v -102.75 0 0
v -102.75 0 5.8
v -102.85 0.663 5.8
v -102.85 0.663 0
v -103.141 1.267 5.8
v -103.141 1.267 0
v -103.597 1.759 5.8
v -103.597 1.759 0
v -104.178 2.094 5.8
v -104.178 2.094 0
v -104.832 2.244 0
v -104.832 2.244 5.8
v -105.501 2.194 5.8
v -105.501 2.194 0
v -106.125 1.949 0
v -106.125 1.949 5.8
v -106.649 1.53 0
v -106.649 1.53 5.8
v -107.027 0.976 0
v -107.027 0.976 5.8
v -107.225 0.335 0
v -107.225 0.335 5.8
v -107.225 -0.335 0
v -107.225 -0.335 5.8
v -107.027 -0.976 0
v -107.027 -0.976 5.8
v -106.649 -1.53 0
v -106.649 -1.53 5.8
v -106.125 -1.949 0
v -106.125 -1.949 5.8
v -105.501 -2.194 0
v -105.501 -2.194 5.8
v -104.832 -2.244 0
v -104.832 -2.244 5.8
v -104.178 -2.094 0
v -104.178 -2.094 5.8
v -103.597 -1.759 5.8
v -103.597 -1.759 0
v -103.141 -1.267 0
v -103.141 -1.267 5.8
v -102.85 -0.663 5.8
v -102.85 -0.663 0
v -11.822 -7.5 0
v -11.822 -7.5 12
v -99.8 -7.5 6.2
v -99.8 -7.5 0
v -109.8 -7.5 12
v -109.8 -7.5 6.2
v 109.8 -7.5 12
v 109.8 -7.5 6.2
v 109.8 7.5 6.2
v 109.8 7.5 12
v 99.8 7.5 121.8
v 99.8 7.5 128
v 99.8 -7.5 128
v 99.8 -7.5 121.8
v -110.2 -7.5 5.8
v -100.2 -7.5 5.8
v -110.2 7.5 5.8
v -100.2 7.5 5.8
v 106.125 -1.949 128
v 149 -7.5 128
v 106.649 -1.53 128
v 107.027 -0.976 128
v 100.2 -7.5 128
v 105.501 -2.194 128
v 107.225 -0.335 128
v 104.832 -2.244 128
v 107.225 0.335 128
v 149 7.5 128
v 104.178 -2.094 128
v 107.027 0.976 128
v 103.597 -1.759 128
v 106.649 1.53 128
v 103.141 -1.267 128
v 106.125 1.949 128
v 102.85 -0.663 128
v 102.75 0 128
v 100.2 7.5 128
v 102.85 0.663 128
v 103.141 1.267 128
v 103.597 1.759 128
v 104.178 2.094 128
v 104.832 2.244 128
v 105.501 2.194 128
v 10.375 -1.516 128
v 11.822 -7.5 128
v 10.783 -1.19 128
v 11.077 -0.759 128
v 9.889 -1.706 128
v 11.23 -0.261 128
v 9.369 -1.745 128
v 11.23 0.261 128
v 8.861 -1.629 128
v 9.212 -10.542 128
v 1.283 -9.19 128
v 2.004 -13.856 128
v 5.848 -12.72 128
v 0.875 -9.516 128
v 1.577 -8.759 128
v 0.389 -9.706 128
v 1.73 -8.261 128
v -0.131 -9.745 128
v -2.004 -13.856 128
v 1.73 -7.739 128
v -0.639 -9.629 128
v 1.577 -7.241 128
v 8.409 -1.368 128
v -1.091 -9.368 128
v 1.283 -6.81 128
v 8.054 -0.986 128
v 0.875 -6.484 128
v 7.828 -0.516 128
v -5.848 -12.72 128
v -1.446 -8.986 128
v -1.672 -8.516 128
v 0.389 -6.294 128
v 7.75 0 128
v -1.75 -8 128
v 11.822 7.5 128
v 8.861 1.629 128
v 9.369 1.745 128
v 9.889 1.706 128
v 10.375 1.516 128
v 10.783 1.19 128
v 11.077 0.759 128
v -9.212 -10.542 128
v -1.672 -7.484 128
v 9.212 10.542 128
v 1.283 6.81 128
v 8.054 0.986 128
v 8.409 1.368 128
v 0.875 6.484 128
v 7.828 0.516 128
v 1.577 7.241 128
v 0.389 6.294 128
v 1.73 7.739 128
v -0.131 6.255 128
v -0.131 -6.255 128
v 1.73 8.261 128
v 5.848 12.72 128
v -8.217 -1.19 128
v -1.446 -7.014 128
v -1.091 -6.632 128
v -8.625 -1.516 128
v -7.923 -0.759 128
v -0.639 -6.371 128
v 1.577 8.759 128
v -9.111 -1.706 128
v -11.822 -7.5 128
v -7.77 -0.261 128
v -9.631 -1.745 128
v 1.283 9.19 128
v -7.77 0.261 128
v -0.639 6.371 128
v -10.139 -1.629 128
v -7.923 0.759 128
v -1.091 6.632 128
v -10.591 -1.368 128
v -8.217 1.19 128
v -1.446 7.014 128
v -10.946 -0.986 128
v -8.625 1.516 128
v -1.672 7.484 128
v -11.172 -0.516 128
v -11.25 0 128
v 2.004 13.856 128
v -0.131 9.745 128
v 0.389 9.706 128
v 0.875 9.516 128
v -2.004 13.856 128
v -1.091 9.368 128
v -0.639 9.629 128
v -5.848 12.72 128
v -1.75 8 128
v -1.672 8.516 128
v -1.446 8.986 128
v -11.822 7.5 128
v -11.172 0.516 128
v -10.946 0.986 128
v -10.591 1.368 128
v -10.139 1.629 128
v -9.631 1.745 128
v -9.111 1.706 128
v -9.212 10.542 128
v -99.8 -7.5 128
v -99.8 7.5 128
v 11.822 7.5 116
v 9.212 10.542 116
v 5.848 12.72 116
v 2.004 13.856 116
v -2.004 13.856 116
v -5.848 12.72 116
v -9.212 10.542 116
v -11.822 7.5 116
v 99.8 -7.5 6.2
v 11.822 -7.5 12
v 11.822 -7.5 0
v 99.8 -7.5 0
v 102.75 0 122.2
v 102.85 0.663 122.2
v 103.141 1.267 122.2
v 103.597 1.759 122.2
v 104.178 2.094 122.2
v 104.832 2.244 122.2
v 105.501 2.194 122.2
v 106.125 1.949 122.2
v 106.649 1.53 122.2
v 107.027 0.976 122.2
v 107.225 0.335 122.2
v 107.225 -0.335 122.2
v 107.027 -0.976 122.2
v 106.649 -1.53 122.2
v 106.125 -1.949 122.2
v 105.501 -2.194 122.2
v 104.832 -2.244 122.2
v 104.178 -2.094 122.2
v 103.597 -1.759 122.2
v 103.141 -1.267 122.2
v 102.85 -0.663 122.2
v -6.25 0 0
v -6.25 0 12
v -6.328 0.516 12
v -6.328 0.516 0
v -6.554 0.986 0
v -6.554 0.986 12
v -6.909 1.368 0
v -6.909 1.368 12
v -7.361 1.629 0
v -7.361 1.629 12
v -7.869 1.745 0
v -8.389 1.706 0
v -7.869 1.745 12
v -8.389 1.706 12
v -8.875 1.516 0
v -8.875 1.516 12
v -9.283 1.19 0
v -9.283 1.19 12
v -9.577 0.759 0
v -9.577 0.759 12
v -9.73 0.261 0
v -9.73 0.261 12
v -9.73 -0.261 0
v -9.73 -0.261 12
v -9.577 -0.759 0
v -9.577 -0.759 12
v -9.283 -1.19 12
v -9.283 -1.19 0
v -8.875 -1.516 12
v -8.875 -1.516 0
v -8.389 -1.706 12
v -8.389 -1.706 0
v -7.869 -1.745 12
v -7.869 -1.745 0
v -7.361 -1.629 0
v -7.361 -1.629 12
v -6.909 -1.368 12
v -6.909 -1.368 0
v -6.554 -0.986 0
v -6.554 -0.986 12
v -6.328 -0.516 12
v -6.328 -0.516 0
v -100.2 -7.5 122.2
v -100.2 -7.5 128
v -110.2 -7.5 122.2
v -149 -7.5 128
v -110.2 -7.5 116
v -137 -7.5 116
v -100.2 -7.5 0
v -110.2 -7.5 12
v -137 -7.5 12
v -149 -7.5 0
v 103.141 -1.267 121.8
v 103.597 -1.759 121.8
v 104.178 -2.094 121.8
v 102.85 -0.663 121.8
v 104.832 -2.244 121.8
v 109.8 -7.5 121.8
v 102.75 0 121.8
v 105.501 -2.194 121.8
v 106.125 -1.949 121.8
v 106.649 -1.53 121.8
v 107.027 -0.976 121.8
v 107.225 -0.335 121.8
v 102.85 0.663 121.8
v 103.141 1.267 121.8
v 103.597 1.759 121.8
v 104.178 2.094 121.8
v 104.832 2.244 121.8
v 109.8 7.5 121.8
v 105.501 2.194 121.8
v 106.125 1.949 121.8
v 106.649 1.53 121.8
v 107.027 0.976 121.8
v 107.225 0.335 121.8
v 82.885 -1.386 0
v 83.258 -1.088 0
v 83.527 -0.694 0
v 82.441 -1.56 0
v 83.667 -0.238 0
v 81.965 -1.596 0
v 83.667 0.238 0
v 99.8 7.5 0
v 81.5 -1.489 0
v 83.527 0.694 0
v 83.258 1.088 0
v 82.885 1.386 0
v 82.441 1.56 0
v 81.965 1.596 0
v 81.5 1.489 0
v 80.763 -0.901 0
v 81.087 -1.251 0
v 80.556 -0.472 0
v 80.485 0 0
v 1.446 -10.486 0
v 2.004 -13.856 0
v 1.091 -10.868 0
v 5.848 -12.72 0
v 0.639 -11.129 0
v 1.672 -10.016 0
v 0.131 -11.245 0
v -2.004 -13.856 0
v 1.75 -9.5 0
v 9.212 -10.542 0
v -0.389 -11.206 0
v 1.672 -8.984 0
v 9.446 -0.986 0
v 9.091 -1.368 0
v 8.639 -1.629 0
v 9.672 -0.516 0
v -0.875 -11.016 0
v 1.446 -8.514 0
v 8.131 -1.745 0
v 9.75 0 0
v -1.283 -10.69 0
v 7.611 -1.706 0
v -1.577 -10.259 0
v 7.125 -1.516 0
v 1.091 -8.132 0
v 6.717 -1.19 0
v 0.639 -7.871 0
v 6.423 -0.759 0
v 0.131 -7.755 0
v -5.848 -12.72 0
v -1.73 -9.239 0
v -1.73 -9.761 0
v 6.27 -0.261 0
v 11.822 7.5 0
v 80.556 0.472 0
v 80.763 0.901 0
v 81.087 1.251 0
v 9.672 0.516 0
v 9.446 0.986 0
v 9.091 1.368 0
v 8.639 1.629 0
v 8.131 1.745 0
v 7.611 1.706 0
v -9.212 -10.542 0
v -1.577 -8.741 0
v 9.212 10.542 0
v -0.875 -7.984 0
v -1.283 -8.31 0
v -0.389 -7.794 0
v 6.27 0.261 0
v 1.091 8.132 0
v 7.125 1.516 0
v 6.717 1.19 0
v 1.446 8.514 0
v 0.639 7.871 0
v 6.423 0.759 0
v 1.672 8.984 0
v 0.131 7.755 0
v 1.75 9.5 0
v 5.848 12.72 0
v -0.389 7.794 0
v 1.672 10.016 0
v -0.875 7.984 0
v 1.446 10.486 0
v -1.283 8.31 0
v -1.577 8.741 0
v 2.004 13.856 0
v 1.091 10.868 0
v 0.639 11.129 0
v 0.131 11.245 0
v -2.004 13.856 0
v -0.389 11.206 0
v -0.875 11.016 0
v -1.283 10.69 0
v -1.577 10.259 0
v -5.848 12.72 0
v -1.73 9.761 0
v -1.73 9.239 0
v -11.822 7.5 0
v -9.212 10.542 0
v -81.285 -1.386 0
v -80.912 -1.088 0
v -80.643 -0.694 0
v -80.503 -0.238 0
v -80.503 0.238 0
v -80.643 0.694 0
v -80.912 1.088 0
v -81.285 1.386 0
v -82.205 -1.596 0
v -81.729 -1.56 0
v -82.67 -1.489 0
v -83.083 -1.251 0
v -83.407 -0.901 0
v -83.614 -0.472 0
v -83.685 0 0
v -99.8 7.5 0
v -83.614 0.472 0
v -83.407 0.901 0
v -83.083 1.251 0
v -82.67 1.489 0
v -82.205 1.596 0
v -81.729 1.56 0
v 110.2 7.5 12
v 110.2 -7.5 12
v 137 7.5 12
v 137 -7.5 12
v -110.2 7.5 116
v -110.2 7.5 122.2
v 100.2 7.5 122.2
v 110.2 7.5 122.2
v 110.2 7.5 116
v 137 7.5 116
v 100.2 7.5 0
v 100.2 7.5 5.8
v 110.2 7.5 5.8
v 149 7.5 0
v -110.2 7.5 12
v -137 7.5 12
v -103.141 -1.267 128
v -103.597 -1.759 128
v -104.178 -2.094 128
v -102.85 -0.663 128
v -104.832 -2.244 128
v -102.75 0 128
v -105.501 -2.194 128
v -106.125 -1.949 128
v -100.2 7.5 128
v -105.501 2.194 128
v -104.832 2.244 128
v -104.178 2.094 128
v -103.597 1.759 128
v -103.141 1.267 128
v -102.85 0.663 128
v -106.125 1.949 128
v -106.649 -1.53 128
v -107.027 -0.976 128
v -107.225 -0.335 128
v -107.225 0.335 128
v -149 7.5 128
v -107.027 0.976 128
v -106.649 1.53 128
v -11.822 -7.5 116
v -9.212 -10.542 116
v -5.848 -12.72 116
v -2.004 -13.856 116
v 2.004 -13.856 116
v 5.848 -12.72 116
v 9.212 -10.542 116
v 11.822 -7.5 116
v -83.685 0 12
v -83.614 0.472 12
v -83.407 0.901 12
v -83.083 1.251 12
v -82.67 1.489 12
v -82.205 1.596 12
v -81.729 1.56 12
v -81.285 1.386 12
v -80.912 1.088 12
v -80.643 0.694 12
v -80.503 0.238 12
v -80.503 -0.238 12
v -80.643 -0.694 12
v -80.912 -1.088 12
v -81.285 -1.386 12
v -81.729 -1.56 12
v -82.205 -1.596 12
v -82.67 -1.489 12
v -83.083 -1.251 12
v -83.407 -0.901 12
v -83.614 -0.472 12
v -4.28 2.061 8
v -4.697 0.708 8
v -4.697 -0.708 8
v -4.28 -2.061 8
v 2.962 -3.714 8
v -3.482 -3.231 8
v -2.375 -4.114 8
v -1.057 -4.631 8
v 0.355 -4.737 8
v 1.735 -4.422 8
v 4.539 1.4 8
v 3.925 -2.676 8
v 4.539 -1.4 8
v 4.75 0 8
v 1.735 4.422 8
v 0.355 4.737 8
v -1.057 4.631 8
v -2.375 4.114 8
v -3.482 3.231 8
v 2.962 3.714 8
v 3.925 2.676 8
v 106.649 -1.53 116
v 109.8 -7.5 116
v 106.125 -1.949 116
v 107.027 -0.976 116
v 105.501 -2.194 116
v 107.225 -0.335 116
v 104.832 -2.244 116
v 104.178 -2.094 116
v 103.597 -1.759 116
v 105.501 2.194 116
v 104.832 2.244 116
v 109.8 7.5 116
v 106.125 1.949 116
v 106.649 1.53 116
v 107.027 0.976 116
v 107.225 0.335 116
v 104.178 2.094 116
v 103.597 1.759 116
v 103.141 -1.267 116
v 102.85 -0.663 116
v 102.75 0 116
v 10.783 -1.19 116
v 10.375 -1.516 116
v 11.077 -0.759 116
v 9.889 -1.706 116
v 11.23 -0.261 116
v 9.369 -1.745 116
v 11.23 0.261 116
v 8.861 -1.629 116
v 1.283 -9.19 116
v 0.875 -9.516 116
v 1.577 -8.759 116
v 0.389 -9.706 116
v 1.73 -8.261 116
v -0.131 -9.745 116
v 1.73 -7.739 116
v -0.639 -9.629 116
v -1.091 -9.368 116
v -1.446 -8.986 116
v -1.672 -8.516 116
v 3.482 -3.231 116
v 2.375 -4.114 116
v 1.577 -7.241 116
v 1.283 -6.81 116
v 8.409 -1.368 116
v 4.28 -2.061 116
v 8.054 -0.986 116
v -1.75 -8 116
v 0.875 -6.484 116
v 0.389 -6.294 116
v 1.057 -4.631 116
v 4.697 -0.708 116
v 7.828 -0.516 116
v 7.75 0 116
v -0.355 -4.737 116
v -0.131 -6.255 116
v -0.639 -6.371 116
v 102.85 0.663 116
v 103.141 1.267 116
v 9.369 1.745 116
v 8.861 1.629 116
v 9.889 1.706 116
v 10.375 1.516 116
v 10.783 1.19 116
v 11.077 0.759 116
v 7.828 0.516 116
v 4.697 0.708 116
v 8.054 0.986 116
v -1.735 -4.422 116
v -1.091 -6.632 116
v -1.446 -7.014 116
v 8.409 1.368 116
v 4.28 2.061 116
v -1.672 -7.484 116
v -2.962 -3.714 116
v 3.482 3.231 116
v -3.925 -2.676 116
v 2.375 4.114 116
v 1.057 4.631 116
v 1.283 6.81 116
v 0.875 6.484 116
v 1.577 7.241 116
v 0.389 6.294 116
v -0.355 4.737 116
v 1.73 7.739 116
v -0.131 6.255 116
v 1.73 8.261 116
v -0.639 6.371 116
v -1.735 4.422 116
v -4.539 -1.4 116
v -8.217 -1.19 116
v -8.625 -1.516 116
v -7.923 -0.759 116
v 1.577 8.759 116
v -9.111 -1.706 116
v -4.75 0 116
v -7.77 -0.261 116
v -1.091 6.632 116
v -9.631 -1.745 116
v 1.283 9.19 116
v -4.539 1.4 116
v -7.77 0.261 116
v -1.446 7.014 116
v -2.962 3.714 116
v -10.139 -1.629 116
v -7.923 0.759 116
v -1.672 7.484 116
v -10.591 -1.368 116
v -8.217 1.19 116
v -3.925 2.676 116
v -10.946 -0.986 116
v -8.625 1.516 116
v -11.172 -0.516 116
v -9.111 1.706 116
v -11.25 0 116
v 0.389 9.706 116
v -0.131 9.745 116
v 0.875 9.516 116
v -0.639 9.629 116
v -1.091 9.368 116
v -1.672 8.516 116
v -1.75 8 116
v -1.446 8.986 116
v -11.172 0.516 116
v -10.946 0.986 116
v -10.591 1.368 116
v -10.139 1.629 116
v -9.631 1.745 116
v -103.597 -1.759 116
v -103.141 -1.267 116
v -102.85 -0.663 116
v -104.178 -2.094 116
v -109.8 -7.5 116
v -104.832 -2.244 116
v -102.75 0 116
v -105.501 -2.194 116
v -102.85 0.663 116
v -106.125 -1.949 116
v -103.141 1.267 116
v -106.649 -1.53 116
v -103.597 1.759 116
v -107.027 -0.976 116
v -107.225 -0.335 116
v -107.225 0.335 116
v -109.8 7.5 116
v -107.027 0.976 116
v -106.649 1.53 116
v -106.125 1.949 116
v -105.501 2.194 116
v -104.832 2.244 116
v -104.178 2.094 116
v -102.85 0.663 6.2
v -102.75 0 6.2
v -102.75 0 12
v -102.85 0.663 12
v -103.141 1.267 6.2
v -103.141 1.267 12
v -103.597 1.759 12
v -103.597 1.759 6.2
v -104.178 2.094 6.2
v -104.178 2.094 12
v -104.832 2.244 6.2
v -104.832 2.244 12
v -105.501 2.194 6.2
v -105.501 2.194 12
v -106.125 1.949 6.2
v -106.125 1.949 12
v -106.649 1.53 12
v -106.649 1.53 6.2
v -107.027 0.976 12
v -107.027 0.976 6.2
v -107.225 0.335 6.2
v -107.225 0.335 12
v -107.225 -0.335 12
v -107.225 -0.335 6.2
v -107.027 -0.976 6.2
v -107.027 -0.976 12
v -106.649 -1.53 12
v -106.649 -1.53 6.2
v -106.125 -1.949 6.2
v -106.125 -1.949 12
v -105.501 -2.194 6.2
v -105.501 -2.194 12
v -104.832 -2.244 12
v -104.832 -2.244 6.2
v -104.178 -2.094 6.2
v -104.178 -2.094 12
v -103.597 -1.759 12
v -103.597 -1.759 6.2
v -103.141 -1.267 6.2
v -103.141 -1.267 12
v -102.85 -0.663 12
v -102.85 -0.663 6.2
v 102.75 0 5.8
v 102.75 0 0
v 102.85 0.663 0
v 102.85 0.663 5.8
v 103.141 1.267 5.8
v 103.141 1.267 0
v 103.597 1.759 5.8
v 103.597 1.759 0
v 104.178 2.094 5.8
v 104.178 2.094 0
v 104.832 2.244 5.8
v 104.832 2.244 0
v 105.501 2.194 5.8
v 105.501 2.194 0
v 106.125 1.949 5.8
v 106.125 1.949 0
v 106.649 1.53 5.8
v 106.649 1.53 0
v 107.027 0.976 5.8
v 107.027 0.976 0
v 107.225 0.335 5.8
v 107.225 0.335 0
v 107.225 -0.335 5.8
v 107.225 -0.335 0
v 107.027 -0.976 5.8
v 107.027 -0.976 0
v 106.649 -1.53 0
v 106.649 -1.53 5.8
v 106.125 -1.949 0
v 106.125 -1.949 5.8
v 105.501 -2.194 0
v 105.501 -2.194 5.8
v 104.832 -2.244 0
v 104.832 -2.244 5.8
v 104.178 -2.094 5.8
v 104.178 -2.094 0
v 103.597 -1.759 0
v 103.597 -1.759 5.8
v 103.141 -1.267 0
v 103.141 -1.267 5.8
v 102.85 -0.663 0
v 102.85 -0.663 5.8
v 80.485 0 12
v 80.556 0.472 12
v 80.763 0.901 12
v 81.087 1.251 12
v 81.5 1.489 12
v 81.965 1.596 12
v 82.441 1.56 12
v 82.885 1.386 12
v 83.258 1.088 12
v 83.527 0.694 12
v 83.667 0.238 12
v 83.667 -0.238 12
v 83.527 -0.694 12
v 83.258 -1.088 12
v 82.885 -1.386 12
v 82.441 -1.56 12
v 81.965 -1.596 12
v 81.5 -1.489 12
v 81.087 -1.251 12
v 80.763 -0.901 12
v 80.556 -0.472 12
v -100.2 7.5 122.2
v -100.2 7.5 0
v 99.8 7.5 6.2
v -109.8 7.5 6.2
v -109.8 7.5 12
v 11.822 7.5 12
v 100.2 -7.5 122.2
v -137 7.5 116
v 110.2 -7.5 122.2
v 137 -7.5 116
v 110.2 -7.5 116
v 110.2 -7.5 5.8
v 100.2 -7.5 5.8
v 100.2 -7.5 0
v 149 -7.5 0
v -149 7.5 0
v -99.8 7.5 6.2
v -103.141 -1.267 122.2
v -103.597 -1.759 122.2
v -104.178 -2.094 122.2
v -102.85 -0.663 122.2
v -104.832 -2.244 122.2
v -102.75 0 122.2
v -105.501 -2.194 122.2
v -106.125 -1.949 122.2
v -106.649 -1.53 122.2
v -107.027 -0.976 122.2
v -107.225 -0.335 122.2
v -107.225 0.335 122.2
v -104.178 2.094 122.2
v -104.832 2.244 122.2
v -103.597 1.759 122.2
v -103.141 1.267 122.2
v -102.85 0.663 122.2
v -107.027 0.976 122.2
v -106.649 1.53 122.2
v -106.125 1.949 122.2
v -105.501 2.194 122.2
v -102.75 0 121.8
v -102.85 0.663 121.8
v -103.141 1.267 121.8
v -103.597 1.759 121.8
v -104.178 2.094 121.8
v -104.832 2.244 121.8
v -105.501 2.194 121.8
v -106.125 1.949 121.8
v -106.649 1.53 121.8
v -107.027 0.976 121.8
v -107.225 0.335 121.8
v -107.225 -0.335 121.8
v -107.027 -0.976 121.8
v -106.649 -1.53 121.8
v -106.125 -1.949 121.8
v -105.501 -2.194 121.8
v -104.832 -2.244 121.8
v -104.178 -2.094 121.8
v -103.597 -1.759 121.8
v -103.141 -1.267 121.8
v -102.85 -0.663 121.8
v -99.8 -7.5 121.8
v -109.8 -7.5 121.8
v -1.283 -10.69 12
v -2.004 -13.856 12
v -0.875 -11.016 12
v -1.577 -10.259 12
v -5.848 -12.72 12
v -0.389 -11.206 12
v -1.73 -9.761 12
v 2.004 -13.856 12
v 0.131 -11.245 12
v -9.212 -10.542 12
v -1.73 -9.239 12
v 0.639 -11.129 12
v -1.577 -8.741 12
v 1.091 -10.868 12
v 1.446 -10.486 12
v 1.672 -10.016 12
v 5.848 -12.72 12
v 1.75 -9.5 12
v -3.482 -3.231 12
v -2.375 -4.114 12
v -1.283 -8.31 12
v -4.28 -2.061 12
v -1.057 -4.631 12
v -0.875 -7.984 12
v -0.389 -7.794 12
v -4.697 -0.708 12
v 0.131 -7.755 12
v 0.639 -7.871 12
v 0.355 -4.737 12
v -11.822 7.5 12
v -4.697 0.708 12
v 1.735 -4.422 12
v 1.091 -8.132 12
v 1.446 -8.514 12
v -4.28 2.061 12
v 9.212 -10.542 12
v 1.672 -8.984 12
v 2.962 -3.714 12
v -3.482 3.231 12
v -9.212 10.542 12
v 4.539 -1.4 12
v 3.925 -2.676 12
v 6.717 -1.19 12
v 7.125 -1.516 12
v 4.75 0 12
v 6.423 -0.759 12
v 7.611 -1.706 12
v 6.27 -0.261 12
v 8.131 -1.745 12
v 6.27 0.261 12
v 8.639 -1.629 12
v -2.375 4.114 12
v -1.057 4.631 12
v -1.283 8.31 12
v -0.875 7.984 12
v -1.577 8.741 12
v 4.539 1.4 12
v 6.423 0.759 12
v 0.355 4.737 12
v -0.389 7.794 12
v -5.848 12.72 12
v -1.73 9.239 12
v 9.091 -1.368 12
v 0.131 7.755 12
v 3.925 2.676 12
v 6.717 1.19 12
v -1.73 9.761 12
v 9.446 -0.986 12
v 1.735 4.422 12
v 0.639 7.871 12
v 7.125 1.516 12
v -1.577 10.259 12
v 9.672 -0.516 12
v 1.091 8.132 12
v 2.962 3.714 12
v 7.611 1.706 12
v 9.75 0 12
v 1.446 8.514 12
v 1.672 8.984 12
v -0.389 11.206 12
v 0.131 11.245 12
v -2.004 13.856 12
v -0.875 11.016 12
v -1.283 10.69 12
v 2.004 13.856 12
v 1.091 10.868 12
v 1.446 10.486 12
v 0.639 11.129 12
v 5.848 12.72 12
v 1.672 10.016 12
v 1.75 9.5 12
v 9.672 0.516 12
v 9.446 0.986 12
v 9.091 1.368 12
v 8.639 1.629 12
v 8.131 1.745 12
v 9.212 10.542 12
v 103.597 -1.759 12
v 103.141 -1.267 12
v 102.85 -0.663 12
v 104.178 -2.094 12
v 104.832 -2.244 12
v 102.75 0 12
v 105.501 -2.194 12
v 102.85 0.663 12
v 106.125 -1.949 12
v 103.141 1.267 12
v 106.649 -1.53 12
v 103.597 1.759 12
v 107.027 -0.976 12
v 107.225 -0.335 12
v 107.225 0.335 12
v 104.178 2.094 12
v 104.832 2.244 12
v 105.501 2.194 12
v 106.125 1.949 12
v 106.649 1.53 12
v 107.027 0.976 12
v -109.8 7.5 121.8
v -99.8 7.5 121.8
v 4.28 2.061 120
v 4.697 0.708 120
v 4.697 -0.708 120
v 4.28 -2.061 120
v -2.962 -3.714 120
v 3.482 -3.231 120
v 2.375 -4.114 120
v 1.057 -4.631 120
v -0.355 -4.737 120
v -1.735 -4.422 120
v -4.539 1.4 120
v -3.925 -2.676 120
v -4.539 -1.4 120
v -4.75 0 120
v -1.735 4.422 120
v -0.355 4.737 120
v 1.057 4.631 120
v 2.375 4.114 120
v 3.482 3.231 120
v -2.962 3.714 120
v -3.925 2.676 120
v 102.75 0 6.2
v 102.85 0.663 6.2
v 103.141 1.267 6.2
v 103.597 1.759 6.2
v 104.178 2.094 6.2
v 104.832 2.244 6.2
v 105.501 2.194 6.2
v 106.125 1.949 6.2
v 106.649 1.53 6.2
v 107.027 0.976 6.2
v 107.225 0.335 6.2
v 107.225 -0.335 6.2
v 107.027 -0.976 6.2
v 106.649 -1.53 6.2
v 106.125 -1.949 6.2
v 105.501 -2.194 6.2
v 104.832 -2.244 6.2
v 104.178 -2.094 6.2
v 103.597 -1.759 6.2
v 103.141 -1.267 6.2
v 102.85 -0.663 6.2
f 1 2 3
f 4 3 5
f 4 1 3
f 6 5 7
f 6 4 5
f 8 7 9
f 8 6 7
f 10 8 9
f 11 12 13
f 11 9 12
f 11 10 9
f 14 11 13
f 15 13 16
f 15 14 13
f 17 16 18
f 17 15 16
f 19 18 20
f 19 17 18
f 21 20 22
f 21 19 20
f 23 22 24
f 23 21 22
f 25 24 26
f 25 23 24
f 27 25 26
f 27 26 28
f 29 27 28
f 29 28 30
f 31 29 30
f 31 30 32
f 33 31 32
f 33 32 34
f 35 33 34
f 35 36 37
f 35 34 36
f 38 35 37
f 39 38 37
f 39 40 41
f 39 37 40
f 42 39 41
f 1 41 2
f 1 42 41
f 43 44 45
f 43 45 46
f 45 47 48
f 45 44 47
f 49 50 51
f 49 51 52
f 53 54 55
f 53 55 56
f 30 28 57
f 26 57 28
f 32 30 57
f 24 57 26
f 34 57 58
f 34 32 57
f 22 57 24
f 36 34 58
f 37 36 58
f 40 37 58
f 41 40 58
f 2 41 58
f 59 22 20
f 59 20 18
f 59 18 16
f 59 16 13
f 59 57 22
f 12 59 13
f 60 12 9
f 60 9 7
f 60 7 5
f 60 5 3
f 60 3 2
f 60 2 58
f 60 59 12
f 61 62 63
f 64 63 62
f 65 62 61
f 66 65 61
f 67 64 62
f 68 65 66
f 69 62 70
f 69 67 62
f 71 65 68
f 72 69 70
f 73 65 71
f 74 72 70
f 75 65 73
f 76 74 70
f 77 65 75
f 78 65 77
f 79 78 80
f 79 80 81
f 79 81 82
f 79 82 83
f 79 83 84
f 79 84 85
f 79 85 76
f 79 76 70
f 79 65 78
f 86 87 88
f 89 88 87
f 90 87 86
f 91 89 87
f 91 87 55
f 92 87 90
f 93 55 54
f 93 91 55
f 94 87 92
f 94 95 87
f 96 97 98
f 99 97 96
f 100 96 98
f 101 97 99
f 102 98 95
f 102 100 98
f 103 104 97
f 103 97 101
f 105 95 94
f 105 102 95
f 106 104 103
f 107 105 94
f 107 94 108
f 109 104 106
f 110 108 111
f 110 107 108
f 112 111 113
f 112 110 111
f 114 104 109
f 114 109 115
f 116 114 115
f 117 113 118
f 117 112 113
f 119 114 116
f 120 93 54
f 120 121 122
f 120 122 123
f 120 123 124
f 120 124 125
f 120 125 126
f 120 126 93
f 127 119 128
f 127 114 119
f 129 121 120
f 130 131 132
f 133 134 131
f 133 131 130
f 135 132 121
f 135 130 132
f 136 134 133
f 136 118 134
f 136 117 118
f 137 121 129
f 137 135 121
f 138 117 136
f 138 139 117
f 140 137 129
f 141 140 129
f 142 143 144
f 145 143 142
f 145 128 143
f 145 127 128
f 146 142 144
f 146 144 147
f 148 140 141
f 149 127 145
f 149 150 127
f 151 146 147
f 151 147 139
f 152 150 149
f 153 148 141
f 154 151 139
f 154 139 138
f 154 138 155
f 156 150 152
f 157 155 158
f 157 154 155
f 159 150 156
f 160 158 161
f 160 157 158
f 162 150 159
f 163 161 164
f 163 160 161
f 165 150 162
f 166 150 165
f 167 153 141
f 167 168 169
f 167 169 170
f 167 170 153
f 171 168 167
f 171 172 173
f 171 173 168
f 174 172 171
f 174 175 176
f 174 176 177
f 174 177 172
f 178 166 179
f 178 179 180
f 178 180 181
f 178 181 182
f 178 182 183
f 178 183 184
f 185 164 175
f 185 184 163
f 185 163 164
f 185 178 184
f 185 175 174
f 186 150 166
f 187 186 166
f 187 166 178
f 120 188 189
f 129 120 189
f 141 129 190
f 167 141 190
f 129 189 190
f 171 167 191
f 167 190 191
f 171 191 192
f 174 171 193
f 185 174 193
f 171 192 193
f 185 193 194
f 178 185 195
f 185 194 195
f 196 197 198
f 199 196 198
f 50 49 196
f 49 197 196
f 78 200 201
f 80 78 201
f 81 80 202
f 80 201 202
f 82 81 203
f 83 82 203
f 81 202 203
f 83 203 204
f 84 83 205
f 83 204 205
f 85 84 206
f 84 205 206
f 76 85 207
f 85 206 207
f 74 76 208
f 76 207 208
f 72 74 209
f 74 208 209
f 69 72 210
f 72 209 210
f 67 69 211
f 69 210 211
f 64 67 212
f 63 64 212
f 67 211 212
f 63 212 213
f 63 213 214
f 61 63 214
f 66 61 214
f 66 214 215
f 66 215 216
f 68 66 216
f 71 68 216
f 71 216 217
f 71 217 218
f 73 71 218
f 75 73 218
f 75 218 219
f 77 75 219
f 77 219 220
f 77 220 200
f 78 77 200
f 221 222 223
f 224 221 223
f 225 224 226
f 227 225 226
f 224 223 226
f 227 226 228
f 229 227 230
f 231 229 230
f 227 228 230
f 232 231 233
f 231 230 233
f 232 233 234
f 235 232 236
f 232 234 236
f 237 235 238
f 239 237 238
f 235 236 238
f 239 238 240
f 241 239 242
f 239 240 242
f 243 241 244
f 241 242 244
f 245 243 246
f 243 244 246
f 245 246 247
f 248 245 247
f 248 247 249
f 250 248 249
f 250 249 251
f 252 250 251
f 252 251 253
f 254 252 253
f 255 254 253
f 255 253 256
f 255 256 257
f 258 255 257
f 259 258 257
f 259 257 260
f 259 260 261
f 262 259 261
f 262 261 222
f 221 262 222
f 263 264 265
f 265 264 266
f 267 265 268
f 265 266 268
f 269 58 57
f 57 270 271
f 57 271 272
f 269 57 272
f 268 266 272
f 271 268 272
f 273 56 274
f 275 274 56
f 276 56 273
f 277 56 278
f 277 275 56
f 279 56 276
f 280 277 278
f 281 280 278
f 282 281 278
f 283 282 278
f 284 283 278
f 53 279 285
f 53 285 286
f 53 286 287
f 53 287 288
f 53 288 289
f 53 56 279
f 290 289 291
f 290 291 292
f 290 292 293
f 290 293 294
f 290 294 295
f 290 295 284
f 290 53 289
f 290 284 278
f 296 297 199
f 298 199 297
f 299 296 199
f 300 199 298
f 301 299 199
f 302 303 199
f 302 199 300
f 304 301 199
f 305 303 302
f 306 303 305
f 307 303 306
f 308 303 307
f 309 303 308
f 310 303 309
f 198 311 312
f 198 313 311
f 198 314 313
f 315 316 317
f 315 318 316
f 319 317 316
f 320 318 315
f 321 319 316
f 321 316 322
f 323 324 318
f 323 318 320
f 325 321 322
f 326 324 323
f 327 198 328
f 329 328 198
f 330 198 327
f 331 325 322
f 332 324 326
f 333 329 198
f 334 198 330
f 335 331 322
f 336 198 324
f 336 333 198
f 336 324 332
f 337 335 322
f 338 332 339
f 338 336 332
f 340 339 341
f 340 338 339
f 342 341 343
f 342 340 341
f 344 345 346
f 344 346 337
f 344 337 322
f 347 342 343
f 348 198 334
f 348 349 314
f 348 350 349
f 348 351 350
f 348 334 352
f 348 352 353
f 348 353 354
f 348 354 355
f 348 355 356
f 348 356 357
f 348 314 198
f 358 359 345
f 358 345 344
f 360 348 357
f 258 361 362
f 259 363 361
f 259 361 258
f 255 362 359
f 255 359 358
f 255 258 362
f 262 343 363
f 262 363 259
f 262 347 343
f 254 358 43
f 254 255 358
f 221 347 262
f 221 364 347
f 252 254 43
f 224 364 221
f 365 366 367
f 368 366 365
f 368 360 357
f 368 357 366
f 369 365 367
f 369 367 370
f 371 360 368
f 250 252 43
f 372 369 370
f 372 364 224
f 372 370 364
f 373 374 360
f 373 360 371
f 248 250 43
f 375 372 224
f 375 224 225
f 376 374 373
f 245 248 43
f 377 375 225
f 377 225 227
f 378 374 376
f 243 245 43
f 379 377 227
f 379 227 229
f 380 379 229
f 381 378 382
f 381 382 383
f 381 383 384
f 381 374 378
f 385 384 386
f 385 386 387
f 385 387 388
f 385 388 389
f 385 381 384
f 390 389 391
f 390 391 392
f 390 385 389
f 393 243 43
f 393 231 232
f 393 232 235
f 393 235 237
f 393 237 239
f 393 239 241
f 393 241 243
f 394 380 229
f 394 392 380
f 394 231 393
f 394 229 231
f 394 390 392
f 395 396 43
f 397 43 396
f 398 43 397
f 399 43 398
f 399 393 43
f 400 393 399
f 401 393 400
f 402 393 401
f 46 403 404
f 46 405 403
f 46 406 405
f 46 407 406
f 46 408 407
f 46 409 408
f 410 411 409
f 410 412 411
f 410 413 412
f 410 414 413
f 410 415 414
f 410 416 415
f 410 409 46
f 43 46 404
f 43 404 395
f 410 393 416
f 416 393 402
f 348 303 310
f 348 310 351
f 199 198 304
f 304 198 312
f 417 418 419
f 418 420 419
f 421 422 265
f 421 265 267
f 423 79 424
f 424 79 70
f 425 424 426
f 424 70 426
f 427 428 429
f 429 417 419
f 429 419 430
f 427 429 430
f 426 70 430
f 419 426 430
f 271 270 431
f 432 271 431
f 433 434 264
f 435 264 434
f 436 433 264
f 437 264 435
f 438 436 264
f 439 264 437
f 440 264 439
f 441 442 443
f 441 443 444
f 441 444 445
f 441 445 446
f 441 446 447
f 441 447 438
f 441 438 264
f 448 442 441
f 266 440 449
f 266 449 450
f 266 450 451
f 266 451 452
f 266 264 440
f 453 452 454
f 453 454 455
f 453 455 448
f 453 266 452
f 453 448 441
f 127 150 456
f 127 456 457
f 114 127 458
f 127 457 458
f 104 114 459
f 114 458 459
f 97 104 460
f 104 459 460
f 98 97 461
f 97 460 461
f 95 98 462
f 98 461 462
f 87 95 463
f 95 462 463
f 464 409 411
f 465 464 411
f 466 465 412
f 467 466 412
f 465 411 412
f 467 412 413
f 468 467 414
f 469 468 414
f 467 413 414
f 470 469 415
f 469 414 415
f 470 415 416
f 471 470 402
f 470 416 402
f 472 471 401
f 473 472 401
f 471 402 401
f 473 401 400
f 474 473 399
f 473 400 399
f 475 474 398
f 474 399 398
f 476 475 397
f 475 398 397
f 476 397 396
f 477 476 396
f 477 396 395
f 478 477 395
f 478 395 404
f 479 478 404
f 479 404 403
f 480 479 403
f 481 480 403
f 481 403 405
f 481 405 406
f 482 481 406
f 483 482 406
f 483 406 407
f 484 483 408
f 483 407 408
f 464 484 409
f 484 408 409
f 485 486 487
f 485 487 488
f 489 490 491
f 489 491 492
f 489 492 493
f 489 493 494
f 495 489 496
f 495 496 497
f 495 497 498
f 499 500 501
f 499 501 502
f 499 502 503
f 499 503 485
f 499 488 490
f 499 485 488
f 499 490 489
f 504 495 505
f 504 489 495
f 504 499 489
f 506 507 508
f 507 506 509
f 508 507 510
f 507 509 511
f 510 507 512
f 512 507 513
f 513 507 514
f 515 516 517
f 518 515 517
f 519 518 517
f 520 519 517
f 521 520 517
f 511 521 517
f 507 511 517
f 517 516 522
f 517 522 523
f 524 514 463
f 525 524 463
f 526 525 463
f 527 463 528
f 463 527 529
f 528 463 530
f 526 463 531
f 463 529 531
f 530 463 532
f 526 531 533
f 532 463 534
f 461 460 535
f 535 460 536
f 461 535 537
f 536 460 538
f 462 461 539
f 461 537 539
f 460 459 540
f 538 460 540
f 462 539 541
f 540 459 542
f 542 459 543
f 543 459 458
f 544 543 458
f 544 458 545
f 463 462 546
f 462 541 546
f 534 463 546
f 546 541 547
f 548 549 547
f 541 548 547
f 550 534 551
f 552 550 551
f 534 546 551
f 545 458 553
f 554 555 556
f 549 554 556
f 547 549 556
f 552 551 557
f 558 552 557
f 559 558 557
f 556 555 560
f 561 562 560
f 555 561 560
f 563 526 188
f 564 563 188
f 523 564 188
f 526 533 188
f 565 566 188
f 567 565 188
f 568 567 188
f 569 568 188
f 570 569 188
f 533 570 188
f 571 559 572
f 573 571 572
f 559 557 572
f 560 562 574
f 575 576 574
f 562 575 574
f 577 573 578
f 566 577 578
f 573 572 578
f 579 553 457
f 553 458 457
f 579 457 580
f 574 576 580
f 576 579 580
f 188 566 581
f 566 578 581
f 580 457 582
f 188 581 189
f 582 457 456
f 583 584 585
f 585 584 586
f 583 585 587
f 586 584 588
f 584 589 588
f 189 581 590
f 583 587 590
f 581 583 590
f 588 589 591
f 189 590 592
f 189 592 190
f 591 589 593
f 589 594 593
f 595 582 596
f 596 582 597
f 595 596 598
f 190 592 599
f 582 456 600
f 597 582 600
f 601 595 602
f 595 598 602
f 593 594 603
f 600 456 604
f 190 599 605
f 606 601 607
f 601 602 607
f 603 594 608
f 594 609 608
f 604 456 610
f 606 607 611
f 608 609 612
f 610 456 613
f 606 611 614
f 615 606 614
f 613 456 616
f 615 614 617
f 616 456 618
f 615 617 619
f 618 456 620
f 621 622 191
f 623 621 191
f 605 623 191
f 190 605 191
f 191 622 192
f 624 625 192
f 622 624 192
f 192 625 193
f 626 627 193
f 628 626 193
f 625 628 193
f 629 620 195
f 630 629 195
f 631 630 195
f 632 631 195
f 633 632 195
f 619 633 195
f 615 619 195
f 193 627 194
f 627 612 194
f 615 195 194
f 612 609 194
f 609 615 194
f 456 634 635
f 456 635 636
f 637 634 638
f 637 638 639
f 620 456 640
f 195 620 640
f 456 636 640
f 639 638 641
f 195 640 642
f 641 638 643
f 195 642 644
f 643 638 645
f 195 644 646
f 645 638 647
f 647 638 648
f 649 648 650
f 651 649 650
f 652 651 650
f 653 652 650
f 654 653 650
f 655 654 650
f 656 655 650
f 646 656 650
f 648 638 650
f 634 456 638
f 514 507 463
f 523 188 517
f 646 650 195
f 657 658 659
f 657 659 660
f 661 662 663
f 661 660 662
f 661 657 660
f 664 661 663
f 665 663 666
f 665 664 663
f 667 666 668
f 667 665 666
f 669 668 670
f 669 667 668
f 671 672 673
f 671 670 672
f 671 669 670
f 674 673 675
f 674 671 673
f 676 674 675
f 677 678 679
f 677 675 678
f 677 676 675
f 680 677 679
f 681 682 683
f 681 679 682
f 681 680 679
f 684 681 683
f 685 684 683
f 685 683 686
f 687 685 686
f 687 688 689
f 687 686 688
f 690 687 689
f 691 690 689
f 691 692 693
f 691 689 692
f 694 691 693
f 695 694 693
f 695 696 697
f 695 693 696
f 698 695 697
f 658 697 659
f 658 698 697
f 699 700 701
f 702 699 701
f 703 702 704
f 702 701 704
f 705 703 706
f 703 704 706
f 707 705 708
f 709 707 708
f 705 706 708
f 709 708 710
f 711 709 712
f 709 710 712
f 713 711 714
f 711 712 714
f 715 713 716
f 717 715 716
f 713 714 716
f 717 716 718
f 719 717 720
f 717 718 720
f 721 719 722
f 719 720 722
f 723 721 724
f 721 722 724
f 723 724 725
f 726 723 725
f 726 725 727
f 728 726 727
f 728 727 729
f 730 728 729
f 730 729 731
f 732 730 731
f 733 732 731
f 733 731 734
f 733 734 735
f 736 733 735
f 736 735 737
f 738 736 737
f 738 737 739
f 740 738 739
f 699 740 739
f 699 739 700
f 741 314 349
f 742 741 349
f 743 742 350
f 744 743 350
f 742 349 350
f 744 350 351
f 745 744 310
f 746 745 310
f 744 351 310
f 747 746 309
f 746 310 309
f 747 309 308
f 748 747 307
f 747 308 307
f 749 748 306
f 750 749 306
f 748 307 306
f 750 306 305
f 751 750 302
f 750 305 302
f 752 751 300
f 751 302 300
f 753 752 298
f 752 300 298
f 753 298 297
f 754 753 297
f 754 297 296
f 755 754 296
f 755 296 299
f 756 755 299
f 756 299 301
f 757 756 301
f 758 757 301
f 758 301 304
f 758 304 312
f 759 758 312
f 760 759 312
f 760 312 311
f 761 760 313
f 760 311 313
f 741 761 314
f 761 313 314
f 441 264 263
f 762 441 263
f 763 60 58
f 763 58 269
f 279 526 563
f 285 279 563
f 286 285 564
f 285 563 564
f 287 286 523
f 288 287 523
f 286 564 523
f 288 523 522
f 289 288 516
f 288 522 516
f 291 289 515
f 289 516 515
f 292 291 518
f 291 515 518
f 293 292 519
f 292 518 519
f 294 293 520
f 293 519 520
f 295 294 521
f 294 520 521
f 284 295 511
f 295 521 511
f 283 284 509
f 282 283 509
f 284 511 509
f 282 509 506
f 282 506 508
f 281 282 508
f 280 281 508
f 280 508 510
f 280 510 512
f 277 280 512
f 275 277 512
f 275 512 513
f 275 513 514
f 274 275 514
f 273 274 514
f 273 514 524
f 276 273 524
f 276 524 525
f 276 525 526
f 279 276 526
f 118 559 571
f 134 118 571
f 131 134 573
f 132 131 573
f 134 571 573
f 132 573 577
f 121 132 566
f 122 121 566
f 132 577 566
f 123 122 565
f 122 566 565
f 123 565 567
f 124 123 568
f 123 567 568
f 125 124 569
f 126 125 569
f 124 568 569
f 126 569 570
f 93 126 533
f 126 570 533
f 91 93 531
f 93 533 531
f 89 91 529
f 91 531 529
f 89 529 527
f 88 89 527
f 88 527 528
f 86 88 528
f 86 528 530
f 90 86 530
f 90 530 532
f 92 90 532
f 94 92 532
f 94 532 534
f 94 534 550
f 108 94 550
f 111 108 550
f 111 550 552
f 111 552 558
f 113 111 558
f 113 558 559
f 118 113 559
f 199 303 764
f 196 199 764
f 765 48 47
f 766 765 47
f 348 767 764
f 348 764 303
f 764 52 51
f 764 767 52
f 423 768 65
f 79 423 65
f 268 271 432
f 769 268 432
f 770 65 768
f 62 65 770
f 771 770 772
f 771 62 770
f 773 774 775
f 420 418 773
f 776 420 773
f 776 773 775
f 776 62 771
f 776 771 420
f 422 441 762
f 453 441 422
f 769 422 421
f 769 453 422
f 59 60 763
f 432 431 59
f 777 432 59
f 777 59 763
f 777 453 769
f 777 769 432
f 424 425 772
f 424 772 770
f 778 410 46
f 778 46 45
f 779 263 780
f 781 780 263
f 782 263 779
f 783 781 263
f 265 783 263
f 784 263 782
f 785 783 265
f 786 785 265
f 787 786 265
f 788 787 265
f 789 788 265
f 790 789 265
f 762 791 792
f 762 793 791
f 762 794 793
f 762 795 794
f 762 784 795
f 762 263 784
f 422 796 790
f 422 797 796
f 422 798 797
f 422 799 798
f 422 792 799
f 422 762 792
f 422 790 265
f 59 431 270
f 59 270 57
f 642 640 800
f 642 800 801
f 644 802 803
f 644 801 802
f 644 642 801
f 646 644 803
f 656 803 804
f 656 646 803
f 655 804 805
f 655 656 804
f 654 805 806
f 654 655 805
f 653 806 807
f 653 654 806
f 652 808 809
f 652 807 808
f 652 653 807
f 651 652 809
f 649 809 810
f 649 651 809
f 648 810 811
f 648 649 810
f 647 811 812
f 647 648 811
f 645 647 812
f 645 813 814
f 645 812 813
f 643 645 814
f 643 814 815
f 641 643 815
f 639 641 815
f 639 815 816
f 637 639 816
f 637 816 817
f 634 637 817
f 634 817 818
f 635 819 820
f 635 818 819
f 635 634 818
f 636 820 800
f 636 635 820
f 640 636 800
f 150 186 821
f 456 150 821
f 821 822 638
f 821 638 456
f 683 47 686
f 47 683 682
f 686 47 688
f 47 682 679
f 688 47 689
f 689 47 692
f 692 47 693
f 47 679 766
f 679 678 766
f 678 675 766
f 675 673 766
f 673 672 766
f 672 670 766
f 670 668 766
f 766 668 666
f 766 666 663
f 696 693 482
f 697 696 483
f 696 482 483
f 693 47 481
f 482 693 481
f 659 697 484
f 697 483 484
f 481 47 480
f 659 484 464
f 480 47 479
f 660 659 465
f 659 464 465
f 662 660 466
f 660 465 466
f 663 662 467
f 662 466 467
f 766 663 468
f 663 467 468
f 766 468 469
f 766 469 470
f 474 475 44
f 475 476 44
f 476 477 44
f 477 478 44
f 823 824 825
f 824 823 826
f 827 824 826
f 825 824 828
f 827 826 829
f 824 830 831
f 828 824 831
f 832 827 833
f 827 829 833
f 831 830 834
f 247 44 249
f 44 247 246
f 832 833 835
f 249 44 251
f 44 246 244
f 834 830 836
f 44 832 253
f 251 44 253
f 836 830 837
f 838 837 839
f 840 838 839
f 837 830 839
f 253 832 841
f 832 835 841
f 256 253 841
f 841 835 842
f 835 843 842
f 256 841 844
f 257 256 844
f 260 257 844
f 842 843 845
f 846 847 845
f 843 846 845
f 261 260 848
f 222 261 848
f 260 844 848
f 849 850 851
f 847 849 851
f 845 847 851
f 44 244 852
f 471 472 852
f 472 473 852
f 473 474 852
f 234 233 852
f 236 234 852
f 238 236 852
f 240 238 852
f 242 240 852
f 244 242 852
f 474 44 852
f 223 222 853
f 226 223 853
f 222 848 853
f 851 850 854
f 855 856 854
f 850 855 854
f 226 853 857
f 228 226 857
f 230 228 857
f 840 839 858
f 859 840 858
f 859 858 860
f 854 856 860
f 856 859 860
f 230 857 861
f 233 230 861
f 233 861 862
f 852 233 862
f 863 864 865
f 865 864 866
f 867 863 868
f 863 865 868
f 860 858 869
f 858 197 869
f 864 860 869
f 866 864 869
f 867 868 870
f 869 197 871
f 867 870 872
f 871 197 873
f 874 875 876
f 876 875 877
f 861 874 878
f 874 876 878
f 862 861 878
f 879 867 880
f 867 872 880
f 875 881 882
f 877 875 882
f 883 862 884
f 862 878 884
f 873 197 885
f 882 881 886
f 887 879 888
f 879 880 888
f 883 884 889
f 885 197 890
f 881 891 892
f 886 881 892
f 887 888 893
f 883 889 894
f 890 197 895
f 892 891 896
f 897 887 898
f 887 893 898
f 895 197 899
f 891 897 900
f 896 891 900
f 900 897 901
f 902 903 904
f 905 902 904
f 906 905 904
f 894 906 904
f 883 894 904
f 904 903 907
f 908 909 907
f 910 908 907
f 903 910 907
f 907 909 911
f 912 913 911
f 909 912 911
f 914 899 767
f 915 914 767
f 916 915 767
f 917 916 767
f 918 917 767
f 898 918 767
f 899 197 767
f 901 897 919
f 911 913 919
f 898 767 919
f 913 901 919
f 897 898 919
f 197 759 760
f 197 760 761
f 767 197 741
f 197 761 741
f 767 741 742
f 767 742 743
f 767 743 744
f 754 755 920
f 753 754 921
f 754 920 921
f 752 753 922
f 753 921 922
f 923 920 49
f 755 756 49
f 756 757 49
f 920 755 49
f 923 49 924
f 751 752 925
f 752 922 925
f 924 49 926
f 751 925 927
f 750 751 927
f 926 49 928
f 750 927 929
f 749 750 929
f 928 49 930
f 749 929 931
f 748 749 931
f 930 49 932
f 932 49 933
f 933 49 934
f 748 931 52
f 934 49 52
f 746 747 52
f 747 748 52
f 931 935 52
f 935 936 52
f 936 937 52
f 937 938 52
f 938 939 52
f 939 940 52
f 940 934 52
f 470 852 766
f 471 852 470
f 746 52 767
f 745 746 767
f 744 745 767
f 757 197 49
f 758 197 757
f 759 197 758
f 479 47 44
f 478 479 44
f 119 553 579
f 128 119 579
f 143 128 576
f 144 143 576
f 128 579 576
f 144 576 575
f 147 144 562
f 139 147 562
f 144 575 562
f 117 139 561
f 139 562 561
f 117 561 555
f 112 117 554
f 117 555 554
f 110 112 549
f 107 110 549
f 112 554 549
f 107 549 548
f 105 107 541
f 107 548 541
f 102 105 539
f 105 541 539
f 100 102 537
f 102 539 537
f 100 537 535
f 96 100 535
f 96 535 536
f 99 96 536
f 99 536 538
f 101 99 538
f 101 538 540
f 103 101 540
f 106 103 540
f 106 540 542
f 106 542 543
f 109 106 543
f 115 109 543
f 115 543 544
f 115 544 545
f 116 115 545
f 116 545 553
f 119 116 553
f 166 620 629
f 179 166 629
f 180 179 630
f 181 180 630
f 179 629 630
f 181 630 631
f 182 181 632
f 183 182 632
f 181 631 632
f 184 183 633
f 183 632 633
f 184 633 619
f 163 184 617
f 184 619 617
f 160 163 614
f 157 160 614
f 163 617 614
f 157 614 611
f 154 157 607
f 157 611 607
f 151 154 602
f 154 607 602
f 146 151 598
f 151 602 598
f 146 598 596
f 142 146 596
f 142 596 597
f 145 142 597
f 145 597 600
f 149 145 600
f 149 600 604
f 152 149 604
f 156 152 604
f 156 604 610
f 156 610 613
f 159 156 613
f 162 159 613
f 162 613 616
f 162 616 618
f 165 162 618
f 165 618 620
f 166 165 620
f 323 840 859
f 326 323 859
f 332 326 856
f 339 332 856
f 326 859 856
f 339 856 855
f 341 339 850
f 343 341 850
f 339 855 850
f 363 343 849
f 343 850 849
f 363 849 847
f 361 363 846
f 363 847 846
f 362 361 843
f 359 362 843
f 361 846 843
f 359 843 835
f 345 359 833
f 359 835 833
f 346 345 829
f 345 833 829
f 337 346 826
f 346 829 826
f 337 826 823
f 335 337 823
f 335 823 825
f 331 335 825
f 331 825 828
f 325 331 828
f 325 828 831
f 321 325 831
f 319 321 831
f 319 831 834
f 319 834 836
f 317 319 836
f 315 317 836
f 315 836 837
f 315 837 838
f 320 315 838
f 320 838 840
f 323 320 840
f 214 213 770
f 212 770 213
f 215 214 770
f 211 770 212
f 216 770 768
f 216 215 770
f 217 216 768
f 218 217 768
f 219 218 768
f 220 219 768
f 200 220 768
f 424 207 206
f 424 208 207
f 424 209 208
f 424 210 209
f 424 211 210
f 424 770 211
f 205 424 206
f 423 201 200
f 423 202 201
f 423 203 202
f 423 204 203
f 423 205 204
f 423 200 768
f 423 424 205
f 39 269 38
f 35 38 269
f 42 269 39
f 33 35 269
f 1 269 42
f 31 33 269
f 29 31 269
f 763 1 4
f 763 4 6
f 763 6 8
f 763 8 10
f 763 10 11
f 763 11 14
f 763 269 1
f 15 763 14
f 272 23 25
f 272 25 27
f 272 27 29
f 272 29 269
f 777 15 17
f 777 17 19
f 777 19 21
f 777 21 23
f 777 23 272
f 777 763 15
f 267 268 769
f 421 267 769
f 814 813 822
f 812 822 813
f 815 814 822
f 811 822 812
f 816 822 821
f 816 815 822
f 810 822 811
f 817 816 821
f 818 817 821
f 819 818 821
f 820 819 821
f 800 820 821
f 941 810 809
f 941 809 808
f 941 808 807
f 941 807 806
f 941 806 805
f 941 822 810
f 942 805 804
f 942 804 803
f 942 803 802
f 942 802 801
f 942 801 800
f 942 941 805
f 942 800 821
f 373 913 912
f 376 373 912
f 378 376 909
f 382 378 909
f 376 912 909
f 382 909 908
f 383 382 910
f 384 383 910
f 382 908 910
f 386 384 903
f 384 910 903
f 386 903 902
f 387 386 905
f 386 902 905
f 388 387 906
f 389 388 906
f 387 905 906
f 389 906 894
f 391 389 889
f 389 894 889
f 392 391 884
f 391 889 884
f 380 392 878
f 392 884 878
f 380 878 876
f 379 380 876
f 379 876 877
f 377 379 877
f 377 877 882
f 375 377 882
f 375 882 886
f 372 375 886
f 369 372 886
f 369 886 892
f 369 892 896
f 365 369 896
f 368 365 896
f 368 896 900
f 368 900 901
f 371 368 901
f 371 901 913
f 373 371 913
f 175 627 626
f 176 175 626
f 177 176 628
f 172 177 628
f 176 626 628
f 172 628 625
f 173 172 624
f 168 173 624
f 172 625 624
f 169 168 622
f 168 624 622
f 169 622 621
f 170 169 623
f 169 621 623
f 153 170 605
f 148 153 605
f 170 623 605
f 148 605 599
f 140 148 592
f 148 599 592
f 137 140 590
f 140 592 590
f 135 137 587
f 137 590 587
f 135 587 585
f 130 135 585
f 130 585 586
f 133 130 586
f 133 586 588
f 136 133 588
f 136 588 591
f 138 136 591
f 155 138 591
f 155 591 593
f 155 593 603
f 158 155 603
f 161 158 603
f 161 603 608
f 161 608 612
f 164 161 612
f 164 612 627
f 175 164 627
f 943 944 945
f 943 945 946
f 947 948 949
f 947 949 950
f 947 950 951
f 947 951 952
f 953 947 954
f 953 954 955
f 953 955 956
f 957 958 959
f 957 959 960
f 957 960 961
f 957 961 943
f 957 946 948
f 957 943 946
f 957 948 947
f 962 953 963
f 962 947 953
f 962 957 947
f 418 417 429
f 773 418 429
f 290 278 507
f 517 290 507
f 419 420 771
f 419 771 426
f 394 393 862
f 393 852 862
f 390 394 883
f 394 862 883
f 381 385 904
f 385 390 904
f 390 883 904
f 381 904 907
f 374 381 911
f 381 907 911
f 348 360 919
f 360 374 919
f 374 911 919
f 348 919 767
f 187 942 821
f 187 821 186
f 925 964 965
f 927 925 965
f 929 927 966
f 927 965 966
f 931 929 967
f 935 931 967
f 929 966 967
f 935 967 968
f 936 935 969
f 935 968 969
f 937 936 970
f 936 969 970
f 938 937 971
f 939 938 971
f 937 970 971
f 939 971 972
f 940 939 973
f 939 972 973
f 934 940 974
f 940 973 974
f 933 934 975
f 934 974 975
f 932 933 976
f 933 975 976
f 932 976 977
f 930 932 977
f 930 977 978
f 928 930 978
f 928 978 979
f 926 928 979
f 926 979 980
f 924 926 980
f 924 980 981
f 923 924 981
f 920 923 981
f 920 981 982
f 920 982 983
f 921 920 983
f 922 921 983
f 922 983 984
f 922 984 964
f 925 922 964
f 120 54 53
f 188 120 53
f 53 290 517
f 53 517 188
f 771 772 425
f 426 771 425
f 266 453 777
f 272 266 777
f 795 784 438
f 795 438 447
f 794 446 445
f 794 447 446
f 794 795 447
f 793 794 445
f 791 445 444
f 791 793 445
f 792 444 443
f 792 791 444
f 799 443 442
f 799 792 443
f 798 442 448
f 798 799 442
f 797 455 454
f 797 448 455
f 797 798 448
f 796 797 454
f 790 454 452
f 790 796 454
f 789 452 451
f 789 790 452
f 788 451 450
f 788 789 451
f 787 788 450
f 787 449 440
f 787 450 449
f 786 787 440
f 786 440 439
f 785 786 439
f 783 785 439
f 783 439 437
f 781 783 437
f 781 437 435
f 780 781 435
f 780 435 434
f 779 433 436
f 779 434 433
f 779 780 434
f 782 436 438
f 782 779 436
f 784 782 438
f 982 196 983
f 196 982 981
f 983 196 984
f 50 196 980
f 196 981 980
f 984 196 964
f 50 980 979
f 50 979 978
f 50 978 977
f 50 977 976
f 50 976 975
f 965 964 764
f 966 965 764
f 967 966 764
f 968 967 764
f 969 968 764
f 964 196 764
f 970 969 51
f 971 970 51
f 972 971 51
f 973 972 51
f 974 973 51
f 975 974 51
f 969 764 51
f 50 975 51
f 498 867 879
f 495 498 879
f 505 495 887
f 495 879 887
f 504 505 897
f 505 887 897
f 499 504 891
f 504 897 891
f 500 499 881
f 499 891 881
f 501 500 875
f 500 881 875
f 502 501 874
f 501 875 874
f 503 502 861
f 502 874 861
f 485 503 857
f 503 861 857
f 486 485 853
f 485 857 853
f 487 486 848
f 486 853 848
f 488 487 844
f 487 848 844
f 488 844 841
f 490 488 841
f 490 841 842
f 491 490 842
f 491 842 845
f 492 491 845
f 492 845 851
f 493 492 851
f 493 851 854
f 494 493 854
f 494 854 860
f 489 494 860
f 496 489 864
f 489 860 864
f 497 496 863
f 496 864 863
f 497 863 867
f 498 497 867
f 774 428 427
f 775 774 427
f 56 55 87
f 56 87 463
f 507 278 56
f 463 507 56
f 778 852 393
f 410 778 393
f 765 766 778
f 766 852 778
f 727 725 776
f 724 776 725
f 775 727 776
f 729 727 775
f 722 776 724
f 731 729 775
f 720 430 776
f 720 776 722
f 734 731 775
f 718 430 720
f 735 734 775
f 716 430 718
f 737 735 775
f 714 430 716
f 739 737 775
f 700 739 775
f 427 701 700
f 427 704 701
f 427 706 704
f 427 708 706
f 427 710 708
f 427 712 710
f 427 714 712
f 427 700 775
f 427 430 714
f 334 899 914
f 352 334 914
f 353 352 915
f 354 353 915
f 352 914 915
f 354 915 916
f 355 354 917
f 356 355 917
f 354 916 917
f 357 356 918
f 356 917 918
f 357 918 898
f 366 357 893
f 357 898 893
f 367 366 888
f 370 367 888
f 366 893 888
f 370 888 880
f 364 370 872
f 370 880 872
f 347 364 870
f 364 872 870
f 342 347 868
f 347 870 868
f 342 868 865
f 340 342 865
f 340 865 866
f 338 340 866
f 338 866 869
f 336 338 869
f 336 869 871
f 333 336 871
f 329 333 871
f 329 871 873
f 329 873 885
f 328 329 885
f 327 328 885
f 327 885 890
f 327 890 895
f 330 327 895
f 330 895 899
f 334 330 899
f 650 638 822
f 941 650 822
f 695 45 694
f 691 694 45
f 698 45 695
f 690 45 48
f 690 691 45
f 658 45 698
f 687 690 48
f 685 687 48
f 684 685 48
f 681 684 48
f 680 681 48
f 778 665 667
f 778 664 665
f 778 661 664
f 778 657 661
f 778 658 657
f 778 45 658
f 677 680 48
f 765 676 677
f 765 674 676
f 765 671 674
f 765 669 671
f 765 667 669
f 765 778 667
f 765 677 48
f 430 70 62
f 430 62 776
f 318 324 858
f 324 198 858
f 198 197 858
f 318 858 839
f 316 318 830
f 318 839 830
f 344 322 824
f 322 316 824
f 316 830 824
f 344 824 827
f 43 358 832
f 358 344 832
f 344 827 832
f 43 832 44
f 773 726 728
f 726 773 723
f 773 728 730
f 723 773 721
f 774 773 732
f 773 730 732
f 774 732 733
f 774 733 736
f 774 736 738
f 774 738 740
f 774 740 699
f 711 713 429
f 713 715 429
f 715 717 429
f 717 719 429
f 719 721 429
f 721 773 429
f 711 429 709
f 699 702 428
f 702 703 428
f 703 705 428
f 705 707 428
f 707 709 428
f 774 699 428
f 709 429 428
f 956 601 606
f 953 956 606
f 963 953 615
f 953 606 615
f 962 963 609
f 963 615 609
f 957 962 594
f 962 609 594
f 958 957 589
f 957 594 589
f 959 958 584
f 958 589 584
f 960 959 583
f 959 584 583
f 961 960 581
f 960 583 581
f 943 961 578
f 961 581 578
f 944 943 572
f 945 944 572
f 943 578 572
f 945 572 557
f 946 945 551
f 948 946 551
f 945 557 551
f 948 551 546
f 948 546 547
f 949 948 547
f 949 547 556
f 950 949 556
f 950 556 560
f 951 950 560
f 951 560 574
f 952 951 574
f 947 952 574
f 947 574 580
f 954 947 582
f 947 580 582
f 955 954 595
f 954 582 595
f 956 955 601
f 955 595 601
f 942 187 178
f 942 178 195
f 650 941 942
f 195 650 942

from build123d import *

# Parameters (mm, degrees)
SKETCH2_R           = 14
BOSS_EXTRUDE1_DEPTH = 12
SKETCH10_W          = 12
SKETCH10_H          = 15
BOSS_EXTRUDE5_DEPTH = 149
SKETCH11_W          = 12
SKETCH11_H          = 15
BOSS_EXTRUDE6_DEPTH = 104
SKETCH12_W          = 12
SKETCH12_H          = 15
BOSS_EXTRUDE7_DEPTH = 149
SKETCH13_R          = 14
BOSS_EXTRUDE8_DEPTH = 12
SKETCH4_R           = 4.75
CUT_EXTRUDE2_DEPTH  = 4
SKETCH3_R           = 1.75
CUT_EXTRUDE1_DEPTH  = 13
SKETCH14_R          = 4.75
CUT_EXTRUDE3_DEPTH  = 4
SKETCH15_R          = 1.75
CUT_EXTRUDE4_DEPTH  = 13
CUT_EXTRUDE5_DEPTH  = 22.5
SKETCH17_R          = 2.25
CUT_EXTRUDE6_DEPTH  = 129
SKETCH18_R          = 1.6
CUT_EXTRUDE7_DEPTH  = 12


with BuildPart() as part:
    # Sketch2 → Boss-Extrude1 (new body)
    with BuildSketch(Plane(origin=(0, 0, 12), x_dir=(-1, 0, 0), z_dir=(0, 0, -1))):
        Circle(SKETCH2_R)
    extrude(amount=BOSS_EXTRUDE1_DEPTH)

    # Sketch10 → Boss-Extrude5 (add)
    with BuildSketch(Plane(origin=(0, 0, 0), x_dir=(0, 0, -1), z_dir=(1, 0, 0))):
        with Locations((-6, 0)):
            Rectangle(SKETCH10_W, SKETCH10_H)
    boss_extrude5 = extrude(amount=BOSS_EXTRUDE5_DEPTH)

    # Sketch11 → Boss-Extrude6 (add)
    with BuildSketch(Plane.XY.offset(12)):
        with Locations((143, 0)):
            Rectangle(SKETCH11_W, SKETCH11_H)
    boss_extrude6 = extrude(amount=BOSS_EXTRUDE6_DEPTH)

    # Sketch12 → Boss-Extrude7 (add)
    with BuildSketch(Plane(origin=(149, 0, 0), x_dir=(0, 0, -1), z_dir=(1, 0, 0))):
        with Locations((-122, 0)):
            Rectangle(SKETCH12_W, SKETCH12_H)
    boss_extrude7 = extrude(amount=-BOSS_EXTRUDE7_DEPTH)

    # Sketch13 → Boss-Extrude8 (add)
    with BuildSketch(Plane.XY.offset(116)):
        Circle(SKETCH13_R)
    extrude(amount=BOSS_EXTRUDE8_DEPTH)

    # Mirror6: Boss-Extrude5, Boss-Extrude6, Boss-Extrude7 across plane
    add(boss_extrude5.mirror(Plane(origin=(0, 0, 0), x_dir=(0, 0, 1), z_dir=(1, 0, 0))))
    add(boss_extrude6.mirror(Plane(origin=(0, 0, 0), x_dir=(0, 0, 1), z_dir=(1, 0, 0))))
    add(boss_extrude7.mirror(Plane(origin=(0, 0, 0), x_dir=(0, 0, 1), z_dir=(1, 0, 0))))

    # Sketch4 → Cut-Extrude2 (cut)
    with BuildSketch(Plane.XY.offset(12)):
        Circle(SKETCH4_R)
    extrude(amount=-CUT_EXTRUDE2_DEPTH, mode=Mode.SUBTRACT)

    # Sketch3 → Cut-Extrude1 (cut, through all)
    with BuildSketch(Plane.XY.offset(12)):
        with Locations((8, 0)):
            Circle(SKETCH3_R)
        with Locations((0, -9.5)):
            Circle(SKETCH3_R)
        with Locations((-8, 0)):
            Circle(SKETCH3_R)
        with Locations((0, 9.5)):
            Circle(SKETCH3_R)
    extrude(amount=-CUT_EXTRUDE1_DEPTH, mode=Mode.SUBTRACT)

    # Sketch14 → Cut-Extrude3 (cut)
    with BuildSketch(Plane(origin=(0, 0, 116), x_dir=(-1, 0, 0), z_dir=(0, 0, -1))):
        Circle(SKETCH14_R)
    extrude(amount=-CUT_EXTRUDE3_DEPTH, mode=Mode.SUBTRACT)

    # Sketch15 → Cut-Extrude4 (cut, through all)
    with BuildSketch(Plane(origin=(0, 0, 116), x_dir=(-1, 0, 0), z_dir=(0, 0, -1))):
        with Locations((-9.5, 0)):
            Circle(SKETCH15_R)
        with Locations((0, 8)):
            Circle(SKETCH15_R)
        with Locations((9.5, 0)):
            Circle(SKETCH15_R)
        with Locations((0, -8)):
            Circle(SKETCH15_R)
    extrude(amount=-CUT_EXTRUDE4_DEPTH, mode=Mode.SUBTRACT)

    # Sketch16 → Cut-Extrude5 (cut, through all)
    with BuildSketch(Plane(origin=(0, 7.5, 0), x_dir=(1, 0, 0), z_dir=(0, 1, 0))):
        Polygon((99.8, 0), (99.8, -6.2), (109.8, -6.2), (109.8, -12), (110.2, -12), (110.2, -5.8), (100.2, -5.8), (100.2, 0), align=None)
        Polygon((109.8, -116), (110.2, -116), (110.2, -122.2), (100.2, -122.2), (100.2, -128), (99.8, -128), (99.8, -121.8), (109.8, -121.8), align=None)
        Polygon((-99.8, -128), (-100.2, -128), (-100.2, -122.2), (-110.2, -122.2), (-110.2, -116), (-109.8, -116), (-109.8, -121.8), (-99.8, -121.8), align=None)
        Polygon((-109.8, -12), (-110.2, -12), (-110.2, -5.8), (-100.2, -5.8), (-100.2, 0), (-99.8, 0), (-99.8, -6.2), (-109.8, -6.2), align=None)
    extrude(amount=-CUT_EXTRUDE5_DEPTH, mode=Mode.SUBTRACT)

    # Sketch17 → Cut-Extrude6 (cut, through all)
    with BuildSketch(Plane(origin=(0, 0, 0), x_dir=(-1, 0, 0), z_dir=(0, 0, -1))):
        with Locations((-105, 0)):
            Circle(SKETCH17_R)
    cut_extrude6 = extrude(amount=-CUT_EXTRUDE6_DEPTH, mode=Mode.SUBTRACT)

    # Mirror7: Cut-Extrude6 across plane
    add(cut_extrude6.mirror(Plane(origin=(0, 0, 0), x_dir=(0, 0, 1), z_dir=(1, 0, 0))), mode=Mode.SUBTRACT)

    # Sketch18 → Cut-Extrude7 (cut)
    with BuildSketch(Plane(origin=(0, 0, 0), x_dir=(-1, 0, 0), z_dir=(0, 0, -1))):
        with Locations((82.085, 0)):
            Circle(SKETCH18_R)
        with Locations((-82.085, 0)):
            Circle(SKETCH18_R)
    extrude(amount=-CUT_EXTRUDE7_DEPTH, mode=Mode.SUBTRACT)


solid = part.part
